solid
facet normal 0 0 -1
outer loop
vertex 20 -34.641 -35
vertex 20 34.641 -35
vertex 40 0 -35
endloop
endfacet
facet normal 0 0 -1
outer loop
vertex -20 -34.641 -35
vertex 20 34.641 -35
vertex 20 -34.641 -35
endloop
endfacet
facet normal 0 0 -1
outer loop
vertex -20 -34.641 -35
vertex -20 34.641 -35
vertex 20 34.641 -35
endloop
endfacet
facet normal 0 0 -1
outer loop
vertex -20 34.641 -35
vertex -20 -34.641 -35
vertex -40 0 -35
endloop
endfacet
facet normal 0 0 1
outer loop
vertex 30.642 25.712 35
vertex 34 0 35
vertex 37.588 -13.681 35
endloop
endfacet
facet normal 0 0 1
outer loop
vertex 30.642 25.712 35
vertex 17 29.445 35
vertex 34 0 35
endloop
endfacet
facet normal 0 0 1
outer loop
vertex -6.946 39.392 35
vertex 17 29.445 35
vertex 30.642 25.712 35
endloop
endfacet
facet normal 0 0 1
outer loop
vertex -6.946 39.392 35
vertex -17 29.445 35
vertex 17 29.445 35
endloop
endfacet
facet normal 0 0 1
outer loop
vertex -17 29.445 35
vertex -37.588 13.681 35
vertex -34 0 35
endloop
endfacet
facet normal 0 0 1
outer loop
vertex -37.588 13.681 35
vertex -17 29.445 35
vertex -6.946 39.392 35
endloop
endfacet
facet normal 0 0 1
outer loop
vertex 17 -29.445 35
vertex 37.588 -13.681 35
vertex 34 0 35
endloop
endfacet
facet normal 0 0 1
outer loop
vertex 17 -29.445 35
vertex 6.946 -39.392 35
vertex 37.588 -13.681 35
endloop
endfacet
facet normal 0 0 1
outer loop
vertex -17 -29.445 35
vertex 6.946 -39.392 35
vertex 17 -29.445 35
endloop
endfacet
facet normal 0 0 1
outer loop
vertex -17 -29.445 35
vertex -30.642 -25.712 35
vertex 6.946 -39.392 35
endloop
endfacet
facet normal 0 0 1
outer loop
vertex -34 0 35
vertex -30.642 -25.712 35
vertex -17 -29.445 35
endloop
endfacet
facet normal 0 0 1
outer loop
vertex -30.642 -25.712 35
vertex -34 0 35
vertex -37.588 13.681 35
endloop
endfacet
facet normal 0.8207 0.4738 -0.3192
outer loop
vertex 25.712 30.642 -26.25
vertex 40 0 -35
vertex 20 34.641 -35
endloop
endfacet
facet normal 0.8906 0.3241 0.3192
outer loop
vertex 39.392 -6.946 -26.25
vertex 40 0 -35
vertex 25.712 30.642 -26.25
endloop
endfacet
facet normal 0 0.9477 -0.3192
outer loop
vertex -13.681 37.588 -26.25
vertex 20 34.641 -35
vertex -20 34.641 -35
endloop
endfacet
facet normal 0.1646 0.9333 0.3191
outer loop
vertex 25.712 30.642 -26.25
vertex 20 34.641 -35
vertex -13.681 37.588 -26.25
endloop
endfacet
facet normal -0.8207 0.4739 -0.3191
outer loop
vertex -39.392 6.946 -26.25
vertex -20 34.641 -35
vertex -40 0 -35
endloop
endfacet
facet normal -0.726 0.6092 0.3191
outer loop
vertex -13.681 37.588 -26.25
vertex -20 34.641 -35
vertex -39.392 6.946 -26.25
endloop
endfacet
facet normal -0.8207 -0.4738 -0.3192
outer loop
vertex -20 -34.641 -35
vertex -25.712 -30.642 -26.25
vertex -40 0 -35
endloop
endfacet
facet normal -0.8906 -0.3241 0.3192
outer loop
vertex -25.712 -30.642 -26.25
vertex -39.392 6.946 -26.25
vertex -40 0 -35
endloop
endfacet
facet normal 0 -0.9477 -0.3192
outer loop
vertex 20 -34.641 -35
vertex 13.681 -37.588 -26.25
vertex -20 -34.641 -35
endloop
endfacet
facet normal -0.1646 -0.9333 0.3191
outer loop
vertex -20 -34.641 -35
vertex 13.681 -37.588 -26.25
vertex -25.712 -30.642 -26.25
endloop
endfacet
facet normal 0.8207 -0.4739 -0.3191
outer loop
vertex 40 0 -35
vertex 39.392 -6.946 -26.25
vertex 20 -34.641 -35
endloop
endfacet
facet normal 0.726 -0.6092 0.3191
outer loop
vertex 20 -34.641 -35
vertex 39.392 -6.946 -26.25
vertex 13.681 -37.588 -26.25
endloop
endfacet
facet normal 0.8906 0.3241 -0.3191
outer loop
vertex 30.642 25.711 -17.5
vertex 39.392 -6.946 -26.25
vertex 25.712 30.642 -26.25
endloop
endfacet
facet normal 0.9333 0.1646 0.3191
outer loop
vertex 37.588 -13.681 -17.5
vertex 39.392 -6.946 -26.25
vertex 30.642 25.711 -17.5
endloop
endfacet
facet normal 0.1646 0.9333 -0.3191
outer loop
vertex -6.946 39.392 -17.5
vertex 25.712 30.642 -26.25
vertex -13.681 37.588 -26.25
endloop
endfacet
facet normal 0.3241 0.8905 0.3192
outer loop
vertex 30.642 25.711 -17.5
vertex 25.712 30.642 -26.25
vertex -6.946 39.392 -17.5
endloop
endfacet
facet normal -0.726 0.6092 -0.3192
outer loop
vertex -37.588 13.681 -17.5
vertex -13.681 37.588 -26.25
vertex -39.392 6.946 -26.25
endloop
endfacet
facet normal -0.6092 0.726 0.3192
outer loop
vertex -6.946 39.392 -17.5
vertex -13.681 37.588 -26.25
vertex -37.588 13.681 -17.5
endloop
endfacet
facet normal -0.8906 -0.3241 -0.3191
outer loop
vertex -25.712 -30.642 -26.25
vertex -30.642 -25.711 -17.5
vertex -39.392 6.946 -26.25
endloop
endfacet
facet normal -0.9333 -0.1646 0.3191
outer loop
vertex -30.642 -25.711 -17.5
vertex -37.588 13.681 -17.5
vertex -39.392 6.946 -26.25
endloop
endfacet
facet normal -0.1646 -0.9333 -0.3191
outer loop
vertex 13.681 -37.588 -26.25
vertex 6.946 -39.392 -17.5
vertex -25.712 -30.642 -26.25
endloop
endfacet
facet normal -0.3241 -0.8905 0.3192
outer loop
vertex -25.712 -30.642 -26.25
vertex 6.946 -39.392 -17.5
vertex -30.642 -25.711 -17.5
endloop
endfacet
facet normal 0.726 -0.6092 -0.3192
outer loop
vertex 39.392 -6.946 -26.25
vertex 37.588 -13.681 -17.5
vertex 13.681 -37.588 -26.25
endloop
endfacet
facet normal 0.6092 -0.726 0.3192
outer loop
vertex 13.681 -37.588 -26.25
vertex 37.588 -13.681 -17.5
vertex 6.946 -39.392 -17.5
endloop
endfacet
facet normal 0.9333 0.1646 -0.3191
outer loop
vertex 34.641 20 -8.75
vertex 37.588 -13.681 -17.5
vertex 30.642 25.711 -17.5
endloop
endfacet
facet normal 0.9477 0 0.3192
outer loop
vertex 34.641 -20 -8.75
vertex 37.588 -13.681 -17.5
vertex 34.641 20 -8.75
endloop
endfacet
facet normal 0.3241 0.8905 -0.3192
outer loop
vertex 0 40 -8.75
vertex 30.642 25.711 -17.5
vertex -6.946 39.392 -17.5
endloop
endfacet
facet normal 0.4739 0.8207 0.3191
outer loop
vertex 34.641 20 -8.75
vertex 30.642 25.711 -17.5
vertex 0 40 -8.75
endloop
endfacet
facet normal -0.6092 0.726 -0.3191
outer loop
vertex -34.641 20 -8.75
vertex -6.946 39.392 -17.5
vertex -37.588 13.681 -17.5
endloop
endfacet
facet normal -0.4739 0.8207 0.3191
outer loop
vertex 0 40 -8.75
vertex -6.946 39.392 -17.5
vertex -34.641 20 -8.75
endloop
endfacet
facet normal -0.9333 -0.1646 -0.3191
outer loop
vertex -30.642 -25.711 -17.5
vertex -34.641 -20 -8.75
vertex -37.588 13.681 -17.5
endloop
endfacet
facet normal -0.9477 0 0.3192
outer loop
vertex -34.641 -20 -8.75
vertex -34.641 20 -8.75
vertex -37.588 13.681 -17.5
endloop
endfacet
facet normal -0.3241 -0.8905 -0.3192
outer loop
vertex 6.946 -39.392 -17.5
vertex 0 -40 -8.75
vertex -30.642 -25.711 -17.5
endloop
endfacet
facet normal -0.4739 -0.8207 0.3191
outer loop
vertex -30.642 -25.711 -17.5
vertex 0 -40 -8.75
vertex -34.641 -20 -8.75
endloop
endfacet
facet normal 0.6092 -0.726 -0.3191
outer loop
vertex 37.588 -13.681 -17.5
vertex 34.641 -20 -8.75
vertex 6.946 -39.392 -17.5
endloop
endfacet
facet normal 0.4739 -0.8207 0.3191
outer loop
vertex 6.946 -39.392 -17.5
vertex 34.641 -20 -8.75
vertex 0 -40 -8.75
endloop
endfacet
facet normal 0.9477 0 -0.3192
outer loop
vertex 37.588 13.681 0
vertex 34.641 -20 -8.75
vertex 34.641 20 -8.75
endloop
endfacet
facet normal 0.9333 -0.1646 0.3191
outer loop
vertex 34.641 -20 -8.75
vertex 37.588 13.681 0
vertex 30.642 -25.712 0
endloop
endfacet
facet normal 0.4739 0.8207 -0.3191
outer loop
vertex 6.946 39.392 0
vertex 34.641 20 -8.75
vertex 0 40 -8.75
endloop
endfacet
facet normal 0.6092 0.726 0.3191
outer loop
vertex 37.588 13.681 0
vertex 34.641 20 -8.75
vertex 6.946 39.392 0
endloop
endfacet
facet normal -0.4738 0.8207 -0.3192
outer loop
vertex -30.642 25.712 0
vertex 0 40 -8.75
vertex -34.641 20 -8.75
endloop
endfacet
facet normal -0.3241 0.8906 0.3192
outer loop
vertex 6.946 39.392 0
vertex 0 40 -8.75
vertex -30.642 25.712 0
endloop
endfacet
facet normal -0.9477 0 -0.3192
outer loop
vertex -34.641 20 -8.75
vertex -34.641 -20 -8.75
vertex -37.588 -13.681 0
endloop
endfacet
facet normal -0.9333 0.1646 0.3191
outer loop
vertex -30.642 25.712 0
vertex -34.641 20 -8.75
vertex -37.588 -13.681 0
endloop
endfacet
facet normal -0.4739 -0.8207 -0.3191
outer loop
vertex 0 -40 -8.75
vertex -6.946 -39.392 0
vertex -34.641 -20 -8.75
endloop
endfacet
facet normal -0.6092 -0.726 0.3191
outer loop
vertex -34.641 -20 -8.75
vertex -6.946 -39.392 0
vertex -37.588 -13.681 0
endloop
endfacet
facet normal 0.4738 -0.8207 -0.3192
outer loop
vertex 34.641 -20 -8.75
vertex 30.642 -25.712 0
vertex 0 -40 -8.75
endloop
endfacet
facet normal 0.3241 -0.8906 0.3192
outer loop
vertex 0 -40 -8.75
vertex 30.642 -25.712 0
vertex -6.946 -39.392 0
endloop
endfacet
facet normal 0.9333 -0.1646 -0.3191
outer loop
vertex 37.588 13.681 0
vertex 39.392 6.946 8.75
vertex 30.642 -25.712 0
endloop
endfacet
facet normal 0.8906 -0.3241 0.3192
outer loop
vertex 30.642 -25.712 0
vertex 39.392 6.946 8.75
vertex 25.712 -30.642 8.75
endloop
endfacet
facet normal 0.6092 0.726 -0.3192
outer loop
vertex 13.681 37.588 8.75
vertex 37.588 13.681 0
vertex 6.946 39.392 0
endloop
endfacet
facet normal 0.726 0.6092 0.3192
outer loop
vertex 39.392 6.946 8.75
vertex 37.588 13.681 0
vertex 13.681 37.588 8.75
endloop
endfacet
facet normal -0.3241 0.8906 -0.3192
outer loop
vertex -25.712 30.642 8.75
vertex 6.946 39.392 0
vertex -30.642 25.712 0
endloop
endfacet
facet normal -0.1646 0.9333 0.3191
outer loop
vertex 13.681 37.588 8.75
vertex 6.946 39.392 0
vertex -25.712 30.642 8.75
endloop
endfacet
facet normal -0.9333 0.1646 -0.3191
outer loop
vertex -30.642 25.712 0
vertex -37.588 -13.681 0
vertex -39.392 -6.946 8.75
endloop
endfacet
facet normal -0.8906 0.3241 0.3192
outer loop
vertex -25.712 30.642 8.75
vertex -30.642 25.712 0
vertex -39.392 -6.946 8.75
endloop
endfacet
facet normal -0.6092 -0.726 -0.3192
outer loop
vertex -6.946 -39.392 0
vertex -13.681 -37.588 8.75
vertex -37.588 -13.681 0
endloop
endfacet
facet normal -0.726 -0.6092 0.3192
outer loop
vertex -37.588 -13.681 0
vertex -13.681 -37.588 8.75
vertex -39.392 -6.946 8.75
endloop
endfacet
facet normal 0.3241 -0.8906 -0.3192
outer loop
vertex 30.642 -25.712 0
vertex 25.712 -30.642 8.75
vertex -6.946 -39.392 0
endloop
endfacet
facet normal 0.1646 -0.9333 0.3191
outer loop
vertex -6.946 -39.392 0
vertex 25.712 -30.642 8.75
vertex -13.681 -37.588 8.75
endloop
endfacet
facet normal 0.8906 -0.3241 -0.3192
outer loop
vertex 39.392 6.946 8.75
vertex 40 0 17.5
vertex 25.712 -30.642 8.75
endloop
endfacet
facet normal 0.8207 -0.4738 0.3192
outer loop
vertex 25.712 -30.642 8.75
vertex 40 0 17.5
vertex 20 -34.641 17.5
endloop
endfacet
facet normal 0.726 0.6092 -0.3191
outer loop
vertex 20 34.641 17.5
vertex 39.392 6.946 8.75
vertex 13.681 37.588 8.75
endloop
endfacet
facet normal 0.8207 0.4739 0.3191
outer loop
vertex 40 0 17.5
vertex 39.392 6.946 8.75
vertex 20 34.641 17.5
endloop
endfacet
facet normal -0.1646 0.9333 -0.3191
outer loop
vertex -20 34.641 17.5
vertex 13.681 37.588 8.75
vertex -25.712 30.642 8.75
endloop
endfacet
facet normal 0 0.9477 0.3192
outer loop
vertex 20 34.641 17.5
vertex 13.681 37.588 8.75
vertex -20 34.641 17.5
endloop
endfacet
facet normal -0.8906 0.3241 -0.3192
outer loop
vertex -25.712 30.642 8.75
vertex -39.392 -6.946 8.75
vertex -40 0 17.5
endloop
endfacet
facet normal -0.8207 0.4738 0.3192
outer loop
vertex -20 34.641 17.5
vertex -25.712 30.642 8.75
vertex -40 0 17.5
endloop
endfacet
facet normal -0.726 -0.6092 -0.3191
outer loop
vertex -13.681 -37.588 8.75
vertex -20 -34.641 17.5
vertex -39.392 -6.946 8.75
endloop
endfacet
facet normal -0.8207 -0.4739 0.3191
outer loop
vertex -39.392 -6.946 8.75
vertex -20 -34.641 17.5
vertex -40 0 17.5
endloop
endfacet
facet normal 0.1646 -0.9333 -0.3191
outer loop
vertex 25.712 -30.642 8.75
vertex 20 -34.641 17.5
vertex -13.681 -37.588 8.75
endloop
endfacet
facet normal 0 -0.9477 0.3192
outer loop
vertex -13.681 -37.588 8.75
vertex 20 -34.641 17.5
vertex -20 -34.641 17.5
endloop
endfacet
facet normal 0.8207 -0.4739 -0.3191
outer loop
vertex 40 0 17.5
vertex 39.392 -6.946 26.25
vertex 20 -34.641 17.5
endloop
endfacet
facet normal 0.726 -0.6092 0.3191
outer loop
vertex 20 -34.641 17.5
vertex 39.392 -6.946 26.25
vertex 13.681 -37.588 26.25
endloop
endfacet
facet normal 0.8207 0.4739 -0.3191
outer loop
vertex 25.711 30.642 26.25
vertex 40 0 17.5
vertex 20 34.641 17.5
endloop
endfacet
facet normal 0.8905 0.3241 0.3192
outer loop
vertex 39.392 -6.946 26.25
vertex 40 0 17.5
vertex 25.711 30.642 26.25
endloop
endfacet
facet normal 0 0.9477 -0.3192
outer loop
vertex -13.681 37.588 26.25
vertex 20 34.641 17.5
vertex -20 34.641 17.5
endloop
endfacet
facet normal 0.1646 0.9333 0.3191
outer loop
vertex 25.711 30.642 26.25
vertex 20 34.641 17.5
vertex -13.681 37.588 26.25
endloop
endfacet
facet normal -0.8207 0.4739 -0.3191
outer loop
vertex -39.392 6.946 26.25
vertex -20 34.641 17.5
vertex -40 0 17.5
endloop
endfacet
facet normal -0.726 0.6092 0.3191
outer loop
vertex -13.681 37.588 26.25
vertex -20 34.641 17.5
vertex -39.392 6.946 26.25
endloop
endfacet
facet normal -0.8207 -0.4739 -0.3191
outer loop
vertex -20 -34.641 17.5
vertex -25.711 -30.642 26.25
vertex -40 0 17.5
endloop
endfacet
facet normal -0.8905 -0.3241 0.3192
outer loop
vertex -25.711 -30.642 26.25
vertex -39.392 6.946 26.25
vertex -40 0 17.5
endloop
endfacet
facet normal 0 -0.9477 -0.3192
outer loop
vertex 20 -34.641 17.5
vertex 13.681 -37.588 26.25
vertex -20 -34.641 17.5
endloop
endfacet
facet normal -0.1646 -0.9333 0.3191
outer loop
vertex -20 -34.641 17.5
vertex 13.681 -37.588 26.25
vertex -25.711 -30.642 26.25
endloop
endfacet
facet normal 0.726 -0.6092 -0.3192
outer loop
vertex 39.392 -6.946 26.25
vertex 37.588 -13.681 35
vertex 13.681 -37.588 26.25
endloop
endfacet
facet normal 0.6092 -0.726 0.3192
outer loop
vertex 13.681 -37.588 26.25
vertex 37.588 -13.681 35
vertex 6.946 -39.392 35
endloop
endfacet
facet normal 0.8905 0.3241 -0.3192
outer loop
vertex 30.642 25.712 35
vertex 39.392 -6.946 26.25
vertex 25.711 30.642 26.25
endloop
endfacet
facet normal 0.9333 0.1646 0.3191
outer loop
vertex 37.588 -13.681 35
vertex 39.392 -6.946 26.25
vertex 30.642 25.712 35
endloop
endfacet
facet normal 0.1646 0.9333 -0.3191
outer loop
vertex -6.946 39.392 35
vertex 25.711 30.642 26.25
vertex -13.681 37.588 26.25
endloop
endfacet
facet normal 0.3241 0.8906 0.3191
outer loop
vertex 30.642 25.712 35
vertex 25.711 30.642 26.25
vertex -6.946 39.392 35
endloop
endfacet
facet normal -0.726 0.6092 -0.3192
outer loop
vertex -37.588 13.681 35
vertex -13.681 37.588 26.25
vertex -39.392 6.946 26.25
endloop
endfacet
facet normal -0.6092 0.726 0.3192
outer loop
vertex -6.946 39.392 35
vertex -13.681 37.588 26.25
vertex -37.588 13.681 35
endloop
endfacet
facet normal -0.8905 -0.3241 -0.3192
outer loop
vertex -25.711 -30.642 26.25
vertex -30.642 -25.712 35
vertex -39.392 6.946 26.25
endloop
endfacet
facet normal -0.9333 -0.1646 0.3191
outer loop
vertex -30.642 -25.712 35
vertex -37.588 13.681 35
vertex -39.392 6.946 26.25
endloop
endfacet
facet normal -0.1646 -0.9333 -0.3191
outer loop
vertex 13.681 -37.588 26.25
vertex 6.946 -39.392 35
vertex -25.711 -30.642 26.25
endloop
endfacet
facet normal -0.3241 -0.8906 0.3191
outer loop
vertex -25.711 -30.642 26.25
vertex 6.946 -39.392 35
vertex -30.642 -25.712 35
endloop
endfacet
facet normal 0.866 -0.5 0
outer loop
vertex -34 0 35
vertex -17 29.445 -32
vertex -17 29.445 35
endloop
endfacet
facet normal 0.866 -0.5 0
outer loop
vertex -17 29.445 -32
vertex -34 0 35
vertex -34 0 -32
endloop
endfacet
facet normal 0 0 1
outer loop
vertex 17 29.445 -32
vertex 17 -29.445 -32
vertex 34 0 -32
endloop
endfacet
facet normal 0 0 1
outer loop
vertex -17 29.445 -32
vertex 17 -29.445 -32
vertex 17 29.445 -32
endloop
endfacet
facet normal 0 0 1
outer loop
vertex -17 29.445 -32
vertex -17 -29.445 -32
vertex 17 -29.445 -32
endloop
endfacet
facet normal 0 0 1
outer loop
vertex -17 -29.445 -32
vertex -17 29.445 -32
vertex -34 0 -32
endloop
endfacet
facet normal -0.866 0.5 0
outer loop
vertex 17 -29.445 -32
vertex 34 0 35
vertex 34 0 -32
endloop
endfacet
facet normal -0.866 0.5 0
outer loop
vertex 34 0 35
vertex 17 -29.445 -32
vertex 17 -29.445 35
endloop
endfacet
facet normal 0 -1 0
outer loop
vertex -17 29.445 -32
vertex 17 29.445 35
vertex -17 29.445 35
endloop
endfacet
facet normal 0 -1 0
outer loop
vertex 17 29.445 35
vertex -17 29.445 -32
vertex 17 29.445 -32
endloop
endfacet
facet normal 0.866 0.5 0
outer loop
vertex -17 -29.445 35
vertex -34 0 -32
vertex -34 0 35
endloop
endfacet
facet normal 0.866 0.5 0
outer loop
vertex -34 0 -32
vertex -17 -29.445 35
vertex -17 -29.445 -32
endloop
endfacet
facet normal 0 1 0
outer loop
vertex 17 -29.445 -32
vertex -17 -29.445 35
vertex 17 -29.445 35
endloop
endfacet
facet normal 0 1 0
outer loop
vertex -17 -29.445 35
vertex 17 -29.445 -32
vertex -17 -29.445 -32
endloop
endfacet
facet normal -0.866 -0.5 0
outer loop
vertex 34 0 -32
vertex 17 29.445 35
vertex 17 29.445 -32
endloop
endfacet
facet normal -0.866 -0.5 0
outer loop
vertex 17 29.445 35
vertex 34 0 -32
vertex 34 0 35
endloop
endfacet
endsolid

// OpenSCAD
module createHexagonRotated(sidelength, height, twist) {
	linear_extrude(height = height, center = true, convesidelengthity = 0, slices = 8, twist = twist){
		polygon([[-2*sidelength,0],[-sidelength, sidelength*sqrt(3)],[sidelength, sidelength*sqrt(3)],[2*sidelength,0],[sidelength, -sidelength*sqrt(3)], [-sidelength, -sidelength*sqrt(3)]], [[0,1,2,3,4,5]]);
	}
}
module createHexVase(height,sidelength,basewidth, innerwidth, twist){
	difference() {
		createHexagonRotated(sidelength,height, twist);
		translate([0,0 , basewidth ])createHexagonRotated(sidelength-innerwidth, height-basewidth);
	}
}

//usage: createHexVase(
//	vase height, 
//	outer hexagon side length, 
//	base width (how deep the base goes into the vase area, cannot exceed vase height),
//	wall thickness,
//	twist (in degrees) )
//all in mm
createHexVase(70, 20, 2, 3, 80);
